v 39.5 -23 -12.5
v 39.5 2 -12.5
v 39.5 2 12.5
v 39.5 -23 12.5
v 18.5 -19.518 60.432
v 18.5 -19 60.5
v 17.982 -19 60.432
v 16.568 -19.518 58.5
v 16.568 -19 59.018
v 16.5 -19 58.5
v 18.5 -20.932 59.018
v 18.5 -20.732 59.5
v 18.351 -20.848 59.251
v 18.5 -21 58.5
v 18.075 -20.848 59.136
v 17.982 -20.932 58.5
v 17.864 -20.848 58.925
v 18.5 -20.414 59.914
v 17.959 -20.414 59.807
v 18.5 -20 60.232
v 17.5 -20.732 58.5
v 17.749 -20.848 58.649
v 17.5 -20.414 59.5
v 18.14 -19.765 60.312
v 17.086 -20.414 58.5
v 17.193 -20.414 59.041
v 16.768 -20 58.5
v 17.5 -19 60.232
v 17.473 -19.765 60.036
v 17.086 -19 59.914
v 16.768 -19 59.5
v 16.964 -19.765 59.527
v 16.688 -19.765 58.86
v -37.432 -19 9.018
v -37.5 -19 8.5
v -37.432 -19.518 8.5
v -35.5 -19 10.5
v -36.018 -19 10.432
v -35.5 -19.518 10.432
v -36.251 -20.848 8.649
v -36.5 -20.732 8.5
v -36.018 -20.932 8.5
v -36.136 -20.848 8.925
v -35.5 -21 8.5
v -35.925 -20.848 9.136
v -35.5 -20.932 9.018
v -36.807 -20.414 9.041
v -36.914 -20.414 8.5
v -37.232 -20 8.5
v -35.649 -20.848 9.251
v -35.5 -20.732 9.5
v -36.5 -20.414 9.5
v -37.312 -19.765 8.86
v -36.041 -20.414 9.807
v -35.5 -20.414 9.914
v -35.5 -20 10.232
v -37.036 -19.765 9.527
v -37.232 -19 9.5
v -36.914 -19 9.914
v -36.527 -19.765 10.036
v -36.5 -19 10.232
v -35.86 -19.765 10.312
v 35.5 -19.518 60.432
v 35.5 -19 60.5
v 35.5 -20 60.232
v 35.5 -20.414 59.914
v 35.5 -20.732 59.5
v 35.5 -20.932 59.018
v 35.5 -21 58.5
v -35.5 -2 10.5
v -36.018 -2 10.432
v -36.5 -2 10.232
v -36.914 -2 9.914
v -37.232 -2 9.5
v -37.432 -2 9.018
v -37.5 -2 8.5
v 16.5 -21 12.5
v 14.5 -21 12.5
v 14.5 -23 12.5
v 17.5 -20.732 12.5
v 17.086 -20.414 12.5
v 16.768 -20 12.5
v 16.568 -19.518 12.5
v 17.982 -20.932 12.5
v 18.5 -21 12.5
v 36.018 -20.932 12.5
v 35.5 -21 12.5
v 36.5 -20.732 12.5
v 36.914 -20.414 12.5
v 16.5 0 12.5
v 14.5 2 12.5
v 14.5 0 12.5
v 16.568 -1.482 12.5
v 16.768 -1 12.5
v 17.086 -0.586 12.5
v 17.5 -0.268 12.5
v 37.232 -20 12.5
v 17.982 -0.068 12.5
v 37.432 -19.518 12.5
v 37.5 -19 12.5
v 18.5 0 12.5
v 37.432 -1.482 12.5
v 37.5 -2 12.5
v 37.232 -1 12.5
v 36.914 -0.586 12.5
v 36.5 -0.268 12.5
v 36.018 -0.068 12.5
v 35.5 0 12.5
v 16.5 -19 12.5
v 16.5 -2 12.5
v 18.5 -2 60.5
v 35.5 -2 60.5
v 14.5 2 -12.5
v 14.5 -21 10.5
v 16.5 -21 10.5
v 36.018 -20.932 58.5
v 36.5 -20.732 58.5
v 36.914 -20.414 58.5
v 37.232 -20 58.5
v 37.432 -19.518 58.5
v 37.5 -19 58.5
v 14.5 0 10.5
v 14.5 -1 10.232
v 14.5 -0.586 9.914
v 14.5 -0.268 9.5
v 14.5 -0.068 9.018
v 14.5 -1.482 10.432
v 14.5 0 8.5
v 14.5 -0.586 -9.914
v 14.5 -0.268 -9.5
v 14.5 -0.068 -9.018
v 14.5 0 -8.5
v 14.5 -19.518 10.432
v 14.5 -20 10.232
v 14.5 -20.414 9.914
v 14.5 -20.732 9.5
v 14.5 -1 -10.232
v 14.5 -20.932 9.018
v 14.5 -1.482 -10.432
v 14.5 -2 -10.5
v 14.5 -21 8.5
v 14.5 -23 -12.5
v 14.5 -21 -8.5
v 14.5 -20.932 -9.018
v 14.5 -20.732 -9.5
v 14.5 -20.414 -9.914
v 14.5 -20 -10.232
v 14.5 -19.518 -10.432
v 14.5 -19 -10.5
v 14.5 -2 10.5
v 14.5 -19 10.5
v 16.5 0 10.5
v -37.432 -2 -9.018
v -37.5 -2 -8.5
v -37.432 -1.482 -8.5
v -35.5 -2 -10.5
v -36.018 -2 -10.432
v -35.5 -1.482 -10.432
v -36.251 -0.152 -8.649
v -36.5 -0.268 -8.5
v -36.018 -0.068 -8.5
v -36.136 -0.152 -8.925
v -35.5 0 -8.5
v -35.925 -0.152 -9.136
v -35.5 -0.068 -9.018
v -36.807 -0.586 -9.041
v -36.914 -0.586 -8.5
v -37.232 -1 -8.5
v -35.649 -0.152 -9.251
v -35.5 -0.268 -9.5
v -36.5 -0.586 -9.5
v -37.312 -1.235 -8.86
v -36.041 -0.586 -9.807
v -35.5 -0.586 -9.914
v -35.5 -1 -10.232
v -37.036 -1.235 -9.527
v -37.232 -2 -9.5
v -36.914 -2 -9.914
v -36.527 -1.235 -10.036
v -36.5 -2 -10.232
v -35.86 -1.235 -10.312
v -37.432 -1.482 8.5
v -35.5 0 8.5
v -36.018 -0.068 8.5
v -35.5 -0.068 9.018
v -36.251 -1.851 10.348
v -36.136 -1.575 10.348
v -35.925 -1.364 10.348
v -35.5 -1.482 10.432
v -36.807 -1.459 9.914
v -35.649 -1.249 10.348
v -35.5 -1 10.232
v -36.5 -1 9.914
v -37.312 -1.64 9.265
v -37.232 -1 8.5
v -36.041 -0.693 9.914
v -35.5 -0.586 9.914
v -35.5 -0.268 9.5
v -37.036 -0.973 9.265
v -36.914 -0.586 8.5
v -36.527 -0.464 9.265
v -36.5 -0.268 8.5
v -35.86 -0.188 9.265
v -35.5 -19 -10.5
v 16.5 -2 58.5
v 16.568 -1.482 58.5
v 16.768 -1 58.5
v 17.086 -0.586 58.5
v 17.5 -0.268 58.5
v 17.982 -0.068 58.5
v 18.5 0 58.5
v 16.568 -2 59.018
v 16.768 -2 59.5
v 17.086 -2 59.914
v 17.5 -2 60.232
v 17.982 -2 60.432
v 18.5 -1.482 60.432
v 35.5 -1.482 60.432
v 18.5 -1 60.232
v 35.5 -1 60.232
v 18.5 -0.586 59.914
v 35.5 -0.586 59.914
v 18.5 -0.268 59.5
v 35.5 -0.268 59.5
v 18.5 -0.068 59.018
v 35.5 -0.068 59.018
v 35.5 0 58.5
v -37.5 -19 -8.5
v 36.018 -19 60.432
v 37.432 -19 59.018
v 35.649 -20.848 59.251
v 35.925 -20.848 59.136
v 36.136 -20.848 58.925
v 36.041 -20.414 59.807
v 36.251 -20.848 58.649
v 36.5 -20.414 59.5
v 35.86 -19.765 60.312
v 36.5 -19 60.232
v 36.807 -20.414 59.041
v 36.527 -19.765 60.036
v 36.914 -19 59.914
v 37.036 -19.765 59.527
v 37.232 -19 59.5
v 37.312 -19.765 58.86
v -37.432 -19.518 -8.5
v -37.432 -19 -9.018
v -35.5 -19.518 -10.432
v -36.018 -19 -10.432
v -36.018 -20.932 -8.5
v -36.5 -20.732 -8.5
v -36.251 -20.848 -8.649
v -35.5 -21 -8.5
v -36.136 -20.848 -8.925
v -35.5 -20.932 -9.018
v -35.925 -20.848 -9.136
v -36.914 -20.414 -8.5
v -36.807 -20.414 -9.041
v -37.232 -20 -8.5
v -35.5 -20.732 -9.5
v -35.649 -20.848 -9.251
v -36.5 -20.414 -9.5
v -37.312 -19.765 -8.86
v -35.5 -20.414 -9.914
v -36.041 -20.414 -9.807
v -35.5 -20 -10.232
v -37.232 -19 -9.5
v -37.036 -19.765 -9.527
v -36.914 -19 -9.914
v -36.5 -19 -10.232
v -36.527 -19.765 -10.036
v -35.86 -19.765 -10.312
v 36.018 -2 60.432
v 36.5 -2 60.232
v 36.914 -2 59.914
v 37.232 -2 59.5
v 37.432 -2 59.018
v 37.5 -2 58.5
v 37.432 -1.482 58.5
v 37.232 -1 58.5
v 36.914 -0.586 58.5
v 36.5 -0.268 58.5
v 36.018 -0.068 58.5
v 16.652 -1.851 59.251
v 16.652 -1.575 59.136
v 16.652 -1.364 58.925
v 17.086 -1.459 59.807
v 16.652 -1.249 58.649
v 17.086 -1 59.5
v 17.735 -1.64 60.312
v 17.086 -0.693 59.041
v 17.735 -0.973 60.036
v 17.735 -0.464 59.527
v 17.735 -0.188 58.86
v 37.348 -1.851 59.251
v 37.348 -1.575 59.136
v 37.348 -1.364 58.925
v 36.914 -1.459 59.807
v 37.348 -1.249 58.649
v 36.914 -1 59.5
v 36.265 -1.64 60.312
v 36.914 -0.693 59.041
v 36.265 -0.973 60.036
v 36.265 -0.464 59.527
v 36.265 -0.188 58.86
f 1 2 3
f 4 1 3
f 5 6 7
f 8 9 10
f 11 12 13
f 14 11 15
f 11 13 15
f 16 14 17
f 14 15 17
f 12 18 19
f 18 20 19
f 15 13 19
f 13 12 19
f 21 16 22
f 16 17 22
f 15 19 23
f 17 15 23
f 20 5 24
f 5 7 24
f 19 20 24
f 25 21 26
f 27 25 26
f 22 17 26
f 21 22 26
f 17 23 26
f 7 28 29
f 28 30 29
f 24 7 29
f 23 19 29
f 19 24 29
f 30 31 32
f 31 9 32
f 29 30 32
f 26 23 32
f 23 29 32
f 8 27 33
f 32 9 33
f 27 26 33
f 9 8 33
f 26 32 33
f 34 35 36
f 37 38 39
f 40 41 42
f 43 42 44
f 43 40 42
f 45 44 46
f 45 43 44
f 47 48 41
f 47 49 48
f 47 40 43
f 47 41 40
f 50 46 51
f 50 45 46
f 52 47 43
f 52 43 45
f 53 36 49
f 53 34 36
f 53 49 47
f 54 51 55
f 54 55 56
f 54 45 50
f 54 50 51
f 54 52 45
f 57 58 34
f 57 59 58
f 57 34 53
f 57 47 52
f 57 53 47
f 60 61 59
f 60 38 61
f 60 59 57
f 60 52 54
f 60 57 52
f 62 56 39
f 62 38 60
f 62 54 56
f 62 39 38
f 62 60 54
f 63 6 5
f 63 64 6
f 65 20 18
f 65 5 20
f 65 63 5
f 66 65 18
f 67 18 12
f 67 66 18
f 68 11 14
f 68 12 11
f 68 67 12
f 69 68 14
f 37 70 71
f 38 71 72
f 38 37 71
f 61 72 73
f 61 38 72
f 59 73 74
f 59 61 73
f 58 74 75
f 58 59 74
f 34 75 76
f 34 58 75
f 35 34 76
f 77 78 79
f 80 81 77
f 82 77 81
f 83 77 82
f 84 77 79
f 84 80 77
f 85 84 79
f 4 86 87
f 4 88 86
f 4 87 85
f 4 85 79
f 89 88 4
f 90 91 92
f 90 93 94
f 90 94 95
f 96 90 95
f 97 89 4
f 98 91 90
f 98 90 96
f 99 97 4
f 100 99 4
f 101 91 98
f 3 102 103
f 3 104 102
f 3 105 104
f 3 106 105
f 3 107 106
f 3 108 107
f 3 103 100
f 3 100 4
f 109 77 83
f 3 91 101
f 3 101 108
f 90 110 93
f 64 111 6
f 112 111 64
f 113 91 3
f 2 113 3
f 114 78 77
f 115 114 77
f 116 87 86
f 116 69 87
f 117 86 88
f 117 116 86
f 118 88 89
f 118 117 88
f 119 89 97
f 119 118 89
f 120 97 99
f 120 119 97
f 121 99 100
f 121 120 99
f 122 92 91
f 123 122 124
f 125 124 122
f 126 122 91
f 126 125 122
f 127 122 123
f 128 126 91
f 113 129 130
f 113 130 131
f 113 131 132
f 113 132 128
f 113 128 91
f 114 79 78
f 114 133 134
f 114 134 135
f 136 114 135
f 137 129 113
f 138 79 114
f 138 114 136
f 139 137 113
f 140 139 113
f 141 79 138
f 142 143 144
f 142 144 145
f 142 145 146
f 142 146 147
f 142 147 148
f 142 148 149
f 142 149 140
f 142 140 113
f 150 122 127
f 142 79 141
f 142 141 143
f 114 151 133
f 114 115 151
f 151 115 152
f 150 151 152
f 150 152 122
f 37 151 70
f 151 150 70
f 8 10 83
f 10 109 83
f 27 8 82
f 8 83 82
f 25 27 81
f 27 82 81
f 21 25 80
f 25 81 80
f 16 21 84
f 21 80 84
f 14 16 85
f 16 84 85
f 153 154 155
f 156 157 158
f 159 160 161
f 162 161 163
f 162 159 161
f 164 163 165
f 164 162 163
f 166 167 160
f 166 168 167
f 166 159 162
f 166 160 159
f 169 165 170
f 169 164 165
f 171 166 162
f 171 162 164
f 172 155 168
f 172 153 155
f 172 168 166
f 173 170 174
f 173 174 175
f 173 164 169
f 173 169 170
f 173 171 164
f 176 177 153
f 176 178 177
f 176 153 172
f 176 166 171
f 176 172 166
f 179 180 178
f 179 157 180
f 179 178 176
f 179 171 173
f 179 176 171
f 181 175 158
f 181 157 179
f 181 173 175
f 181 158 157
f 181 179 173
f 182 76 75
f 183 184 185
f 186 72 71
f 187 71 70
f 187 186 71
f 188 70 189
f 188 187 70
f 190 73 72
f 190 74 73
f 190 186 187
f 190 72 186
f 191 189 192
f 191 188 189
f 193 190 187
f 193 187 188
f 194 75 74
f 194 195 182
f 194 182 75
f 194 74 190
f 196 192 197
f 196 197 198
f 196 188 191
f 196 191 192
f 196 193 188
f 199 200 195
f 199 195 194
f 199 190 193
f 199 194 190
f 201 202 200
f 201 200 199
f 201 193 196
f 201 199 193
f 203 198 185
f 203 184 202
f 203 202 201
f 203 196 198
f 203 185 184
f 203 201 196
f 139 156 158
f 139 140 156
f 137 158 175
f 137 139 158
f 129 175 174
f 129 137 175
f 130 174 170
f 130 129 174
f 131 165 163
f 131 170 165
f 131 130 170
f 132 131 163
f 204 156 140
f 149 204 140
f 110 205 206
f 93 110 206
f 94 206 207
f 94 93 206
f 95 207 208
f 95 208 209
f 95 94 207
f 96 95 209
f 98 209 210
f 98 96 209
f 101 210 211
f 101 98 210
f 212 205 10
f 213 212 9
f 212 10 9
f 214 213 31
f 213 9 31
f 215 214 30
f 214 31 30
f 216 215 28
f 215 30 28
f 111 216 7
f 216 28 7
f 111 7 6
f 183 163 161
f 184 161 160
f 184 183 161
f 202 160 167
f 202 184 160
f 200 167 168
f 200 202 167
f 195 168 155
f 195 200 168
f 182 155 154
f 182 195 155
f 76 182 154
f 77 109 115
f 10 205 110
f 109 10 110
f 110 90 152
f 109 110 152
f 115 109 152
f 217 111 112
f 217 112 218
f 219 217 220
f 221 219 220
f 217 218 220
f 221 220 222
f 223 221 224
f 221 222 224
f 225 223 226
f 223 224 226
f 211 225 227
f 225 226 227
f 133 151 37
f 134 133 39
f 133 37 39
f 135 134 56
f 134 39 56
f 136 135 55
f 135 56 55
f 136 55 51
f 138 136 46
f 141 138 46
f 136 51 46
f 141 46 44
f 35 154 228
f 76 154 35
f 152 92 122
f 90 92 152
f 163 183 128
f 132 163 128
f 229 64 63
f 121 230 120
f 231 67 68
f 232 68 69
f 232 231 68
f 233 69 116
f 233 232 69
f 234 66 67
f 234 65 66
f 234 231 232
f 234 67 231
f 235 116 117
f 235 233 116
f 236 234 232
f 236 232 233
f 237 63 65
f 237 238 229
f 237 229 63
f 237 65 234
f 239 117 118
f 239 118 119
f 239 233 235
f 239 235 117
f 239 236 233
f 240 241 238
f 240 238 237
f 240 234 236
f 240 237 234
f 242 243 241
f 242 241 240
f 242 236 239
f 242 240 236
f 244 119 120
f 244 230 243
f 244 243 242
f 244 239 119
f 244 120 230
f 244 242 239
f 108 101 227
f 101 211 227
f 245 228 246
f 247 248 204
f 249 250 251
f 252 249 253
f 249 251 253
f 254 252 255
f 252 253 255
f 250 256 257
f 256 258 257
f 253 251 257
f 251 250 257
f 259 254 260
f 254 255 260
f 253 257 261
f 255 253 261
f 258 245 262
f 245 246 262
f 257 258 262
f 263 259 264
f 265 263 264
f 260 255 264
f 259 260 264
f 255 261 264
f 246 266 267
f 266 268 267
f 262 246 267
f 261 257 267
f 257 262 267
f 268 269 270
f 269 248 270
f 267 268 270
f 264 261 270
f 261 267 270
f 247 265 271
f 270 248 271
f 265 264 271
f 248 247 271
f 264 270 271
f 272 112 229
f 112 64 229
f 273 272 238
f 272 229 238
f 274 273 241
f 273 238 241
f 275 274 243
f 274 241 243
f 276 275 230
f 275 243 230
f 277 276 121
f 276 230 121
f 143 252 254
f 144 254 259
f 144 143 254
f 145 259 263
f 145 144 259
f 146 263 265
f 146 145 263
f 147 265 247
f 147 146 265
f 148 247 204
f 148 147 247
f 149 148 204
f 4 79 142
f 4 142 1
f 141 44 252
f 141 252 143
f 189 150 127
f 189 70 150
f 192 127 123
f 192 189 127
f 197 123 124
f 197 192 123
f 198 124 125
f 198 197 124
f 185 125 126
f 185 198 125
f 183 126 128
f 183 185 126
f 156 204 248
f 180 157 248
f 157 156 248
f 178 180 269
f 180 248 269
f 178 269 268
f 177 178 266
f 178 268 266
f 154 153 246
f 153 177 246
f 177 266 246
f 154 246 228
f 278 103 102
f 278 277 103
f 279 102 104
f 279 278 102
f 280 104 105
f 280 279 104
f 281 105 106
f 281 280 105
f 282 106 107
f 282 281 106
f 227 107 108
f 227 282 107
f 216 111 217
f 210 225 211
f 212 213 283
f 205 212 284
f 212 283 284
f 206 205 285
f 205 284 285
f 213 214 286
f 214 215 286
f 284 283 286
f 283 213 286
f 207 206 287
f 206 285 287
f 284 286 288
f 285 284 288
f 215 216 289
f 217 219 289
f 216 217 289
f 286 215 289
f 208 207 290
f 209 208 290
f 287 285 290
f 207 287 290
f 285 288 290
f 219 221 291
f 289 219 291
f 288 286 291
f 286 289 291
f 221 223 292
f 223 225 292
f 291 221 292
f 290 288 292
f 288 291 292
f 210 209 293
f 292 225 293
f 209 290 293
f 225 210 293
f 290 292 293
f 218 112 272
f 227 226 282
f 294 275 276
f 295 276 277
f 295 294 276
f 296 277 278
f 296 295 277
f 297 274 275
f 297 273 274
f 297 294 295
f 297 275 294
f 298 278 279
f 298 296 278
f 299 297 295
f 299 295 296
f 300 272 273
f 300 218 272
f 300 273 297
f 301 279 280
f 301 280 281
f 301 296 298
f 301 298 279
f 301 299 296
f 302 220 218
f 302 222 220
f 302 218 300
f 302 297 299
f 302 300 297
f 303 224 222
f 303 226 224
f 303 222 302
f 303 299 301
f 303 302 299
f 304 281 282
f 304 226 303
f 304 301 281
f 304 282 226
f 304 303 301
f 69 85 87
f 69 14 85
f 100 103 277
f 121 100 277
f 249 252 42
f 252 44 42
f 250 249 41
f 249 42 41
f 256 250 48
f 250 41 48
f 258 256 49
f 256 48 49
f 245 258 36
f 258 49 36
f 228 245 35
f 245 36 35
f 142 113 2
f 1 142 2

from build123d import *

# Parameters (mm, degrees)
F0_W     = 21
F0_H     = 48
F0_W_2   = 52
F0_H_2   = 21
F1_DEPTH = 21
F0_W_3   = 2
F0_H_3   = 2
F2_DEPTH = 2
F3_W     = 25
F3_H     = 25
F4_DEPTH = 2
F5_W     = 25
F5_H     = 25
F6_DEPTH = 2
F7_W     = 25
F7_H     = 25
F8_DEPTH = 2
F9_R     = 2


with BuildPart() as f1:
    # F0 (on Front) → F1 (new body)
    with BuildSketch(Plane.XZ):
        with Locations((27, 36.5)):
            Rectangle(F0_W, F0_H)
        with Locations((-11.5, 0)):
            Rectangle(F0_W_2, F0_H_2)
        Polygon((14.5, -10.5), (37.5, -10.5), (37.5, 10.5), (37.5, 12.5), (16.5, 12.5), (16.5, 10.5), (14.5, 10.5), align=None)
    extrude(amount=F1_DEPTH)

    # F0 (on Front) → F2 (join)
    with BuildSketch(Plane.XZ):
        Polygon((37.5, 10.5), (37.5, -10.5), (14.5, -10.5), (14.5, -12.5), (39.5, -12.5), (39.5, 12.5), (37.5, 12.5), align=None)
        with Locations((15.5, 11.5)):
            Rectangle(F0_W_3, F0_H_3)
        Polygon((14.5, -10.5), (37.5, -10.5), (37.5, 10.5), (37.5, 12.5), (16.5, 12.5), (16.5, 10.5), (14.5, 10.5), align=None)
    extrude(amount=-F2_DEPTH)

    # F3 (on face) → F4 (join)
    with BuildSketch(Plane.XZ.offset(21)):
        with Locations((27, 0)):
            Rectangle(F3_W, F3_H)
    extrude(amount=F4_DEPTH)

    # F5 (on face) → F6 (join)
    with BuildSketch(Plane.YZ.offset(37.5)):
        with Locations((-10.5, 0)):
            Rectangle(F5_W, F5_H)
    extrude(amount=F6_DEPTH)

    # F7 (on face) → F8 (join)
    with BuildSketch(Plane(origin=(0, 0, -10.5), x_dir=(1, 0, 0), z_dir=(0, 0, -1))):
        with Locations((27, 10.5)):
            Rectangle(F7_W, F7_H)
    extrude(amount=F8_DEPTH)

    # F9
    f9_edges = [f1.edges().sort_by_distance(p)[0] for p in [
        (-37.5, -10.5, -10.5),
        (-37.5, 0, 0),
        (-37.5, -10.5, 10.5),
        (-37.5, -21, 0),
        (27, 0, 60.5),
        (16.5, -10.5, 60.5),
        (37.5, -10.5, 60.5),
        (27, -21, 60.5),
        (16.5, -21, 36.5),
        (37.5, -21, 36.5),
        (37.5, 0, 36.5),
        (16.5, 0, 36.5),
        (-11.5, 0, 10.5),
        (-11.5, 0, -10.5),
        (-11.5, -21, 10.5),
        (-11.5, -21, -10.5),
    ]]
    fillet(f9_edges, radius=F9_R)


solid = f1.part
